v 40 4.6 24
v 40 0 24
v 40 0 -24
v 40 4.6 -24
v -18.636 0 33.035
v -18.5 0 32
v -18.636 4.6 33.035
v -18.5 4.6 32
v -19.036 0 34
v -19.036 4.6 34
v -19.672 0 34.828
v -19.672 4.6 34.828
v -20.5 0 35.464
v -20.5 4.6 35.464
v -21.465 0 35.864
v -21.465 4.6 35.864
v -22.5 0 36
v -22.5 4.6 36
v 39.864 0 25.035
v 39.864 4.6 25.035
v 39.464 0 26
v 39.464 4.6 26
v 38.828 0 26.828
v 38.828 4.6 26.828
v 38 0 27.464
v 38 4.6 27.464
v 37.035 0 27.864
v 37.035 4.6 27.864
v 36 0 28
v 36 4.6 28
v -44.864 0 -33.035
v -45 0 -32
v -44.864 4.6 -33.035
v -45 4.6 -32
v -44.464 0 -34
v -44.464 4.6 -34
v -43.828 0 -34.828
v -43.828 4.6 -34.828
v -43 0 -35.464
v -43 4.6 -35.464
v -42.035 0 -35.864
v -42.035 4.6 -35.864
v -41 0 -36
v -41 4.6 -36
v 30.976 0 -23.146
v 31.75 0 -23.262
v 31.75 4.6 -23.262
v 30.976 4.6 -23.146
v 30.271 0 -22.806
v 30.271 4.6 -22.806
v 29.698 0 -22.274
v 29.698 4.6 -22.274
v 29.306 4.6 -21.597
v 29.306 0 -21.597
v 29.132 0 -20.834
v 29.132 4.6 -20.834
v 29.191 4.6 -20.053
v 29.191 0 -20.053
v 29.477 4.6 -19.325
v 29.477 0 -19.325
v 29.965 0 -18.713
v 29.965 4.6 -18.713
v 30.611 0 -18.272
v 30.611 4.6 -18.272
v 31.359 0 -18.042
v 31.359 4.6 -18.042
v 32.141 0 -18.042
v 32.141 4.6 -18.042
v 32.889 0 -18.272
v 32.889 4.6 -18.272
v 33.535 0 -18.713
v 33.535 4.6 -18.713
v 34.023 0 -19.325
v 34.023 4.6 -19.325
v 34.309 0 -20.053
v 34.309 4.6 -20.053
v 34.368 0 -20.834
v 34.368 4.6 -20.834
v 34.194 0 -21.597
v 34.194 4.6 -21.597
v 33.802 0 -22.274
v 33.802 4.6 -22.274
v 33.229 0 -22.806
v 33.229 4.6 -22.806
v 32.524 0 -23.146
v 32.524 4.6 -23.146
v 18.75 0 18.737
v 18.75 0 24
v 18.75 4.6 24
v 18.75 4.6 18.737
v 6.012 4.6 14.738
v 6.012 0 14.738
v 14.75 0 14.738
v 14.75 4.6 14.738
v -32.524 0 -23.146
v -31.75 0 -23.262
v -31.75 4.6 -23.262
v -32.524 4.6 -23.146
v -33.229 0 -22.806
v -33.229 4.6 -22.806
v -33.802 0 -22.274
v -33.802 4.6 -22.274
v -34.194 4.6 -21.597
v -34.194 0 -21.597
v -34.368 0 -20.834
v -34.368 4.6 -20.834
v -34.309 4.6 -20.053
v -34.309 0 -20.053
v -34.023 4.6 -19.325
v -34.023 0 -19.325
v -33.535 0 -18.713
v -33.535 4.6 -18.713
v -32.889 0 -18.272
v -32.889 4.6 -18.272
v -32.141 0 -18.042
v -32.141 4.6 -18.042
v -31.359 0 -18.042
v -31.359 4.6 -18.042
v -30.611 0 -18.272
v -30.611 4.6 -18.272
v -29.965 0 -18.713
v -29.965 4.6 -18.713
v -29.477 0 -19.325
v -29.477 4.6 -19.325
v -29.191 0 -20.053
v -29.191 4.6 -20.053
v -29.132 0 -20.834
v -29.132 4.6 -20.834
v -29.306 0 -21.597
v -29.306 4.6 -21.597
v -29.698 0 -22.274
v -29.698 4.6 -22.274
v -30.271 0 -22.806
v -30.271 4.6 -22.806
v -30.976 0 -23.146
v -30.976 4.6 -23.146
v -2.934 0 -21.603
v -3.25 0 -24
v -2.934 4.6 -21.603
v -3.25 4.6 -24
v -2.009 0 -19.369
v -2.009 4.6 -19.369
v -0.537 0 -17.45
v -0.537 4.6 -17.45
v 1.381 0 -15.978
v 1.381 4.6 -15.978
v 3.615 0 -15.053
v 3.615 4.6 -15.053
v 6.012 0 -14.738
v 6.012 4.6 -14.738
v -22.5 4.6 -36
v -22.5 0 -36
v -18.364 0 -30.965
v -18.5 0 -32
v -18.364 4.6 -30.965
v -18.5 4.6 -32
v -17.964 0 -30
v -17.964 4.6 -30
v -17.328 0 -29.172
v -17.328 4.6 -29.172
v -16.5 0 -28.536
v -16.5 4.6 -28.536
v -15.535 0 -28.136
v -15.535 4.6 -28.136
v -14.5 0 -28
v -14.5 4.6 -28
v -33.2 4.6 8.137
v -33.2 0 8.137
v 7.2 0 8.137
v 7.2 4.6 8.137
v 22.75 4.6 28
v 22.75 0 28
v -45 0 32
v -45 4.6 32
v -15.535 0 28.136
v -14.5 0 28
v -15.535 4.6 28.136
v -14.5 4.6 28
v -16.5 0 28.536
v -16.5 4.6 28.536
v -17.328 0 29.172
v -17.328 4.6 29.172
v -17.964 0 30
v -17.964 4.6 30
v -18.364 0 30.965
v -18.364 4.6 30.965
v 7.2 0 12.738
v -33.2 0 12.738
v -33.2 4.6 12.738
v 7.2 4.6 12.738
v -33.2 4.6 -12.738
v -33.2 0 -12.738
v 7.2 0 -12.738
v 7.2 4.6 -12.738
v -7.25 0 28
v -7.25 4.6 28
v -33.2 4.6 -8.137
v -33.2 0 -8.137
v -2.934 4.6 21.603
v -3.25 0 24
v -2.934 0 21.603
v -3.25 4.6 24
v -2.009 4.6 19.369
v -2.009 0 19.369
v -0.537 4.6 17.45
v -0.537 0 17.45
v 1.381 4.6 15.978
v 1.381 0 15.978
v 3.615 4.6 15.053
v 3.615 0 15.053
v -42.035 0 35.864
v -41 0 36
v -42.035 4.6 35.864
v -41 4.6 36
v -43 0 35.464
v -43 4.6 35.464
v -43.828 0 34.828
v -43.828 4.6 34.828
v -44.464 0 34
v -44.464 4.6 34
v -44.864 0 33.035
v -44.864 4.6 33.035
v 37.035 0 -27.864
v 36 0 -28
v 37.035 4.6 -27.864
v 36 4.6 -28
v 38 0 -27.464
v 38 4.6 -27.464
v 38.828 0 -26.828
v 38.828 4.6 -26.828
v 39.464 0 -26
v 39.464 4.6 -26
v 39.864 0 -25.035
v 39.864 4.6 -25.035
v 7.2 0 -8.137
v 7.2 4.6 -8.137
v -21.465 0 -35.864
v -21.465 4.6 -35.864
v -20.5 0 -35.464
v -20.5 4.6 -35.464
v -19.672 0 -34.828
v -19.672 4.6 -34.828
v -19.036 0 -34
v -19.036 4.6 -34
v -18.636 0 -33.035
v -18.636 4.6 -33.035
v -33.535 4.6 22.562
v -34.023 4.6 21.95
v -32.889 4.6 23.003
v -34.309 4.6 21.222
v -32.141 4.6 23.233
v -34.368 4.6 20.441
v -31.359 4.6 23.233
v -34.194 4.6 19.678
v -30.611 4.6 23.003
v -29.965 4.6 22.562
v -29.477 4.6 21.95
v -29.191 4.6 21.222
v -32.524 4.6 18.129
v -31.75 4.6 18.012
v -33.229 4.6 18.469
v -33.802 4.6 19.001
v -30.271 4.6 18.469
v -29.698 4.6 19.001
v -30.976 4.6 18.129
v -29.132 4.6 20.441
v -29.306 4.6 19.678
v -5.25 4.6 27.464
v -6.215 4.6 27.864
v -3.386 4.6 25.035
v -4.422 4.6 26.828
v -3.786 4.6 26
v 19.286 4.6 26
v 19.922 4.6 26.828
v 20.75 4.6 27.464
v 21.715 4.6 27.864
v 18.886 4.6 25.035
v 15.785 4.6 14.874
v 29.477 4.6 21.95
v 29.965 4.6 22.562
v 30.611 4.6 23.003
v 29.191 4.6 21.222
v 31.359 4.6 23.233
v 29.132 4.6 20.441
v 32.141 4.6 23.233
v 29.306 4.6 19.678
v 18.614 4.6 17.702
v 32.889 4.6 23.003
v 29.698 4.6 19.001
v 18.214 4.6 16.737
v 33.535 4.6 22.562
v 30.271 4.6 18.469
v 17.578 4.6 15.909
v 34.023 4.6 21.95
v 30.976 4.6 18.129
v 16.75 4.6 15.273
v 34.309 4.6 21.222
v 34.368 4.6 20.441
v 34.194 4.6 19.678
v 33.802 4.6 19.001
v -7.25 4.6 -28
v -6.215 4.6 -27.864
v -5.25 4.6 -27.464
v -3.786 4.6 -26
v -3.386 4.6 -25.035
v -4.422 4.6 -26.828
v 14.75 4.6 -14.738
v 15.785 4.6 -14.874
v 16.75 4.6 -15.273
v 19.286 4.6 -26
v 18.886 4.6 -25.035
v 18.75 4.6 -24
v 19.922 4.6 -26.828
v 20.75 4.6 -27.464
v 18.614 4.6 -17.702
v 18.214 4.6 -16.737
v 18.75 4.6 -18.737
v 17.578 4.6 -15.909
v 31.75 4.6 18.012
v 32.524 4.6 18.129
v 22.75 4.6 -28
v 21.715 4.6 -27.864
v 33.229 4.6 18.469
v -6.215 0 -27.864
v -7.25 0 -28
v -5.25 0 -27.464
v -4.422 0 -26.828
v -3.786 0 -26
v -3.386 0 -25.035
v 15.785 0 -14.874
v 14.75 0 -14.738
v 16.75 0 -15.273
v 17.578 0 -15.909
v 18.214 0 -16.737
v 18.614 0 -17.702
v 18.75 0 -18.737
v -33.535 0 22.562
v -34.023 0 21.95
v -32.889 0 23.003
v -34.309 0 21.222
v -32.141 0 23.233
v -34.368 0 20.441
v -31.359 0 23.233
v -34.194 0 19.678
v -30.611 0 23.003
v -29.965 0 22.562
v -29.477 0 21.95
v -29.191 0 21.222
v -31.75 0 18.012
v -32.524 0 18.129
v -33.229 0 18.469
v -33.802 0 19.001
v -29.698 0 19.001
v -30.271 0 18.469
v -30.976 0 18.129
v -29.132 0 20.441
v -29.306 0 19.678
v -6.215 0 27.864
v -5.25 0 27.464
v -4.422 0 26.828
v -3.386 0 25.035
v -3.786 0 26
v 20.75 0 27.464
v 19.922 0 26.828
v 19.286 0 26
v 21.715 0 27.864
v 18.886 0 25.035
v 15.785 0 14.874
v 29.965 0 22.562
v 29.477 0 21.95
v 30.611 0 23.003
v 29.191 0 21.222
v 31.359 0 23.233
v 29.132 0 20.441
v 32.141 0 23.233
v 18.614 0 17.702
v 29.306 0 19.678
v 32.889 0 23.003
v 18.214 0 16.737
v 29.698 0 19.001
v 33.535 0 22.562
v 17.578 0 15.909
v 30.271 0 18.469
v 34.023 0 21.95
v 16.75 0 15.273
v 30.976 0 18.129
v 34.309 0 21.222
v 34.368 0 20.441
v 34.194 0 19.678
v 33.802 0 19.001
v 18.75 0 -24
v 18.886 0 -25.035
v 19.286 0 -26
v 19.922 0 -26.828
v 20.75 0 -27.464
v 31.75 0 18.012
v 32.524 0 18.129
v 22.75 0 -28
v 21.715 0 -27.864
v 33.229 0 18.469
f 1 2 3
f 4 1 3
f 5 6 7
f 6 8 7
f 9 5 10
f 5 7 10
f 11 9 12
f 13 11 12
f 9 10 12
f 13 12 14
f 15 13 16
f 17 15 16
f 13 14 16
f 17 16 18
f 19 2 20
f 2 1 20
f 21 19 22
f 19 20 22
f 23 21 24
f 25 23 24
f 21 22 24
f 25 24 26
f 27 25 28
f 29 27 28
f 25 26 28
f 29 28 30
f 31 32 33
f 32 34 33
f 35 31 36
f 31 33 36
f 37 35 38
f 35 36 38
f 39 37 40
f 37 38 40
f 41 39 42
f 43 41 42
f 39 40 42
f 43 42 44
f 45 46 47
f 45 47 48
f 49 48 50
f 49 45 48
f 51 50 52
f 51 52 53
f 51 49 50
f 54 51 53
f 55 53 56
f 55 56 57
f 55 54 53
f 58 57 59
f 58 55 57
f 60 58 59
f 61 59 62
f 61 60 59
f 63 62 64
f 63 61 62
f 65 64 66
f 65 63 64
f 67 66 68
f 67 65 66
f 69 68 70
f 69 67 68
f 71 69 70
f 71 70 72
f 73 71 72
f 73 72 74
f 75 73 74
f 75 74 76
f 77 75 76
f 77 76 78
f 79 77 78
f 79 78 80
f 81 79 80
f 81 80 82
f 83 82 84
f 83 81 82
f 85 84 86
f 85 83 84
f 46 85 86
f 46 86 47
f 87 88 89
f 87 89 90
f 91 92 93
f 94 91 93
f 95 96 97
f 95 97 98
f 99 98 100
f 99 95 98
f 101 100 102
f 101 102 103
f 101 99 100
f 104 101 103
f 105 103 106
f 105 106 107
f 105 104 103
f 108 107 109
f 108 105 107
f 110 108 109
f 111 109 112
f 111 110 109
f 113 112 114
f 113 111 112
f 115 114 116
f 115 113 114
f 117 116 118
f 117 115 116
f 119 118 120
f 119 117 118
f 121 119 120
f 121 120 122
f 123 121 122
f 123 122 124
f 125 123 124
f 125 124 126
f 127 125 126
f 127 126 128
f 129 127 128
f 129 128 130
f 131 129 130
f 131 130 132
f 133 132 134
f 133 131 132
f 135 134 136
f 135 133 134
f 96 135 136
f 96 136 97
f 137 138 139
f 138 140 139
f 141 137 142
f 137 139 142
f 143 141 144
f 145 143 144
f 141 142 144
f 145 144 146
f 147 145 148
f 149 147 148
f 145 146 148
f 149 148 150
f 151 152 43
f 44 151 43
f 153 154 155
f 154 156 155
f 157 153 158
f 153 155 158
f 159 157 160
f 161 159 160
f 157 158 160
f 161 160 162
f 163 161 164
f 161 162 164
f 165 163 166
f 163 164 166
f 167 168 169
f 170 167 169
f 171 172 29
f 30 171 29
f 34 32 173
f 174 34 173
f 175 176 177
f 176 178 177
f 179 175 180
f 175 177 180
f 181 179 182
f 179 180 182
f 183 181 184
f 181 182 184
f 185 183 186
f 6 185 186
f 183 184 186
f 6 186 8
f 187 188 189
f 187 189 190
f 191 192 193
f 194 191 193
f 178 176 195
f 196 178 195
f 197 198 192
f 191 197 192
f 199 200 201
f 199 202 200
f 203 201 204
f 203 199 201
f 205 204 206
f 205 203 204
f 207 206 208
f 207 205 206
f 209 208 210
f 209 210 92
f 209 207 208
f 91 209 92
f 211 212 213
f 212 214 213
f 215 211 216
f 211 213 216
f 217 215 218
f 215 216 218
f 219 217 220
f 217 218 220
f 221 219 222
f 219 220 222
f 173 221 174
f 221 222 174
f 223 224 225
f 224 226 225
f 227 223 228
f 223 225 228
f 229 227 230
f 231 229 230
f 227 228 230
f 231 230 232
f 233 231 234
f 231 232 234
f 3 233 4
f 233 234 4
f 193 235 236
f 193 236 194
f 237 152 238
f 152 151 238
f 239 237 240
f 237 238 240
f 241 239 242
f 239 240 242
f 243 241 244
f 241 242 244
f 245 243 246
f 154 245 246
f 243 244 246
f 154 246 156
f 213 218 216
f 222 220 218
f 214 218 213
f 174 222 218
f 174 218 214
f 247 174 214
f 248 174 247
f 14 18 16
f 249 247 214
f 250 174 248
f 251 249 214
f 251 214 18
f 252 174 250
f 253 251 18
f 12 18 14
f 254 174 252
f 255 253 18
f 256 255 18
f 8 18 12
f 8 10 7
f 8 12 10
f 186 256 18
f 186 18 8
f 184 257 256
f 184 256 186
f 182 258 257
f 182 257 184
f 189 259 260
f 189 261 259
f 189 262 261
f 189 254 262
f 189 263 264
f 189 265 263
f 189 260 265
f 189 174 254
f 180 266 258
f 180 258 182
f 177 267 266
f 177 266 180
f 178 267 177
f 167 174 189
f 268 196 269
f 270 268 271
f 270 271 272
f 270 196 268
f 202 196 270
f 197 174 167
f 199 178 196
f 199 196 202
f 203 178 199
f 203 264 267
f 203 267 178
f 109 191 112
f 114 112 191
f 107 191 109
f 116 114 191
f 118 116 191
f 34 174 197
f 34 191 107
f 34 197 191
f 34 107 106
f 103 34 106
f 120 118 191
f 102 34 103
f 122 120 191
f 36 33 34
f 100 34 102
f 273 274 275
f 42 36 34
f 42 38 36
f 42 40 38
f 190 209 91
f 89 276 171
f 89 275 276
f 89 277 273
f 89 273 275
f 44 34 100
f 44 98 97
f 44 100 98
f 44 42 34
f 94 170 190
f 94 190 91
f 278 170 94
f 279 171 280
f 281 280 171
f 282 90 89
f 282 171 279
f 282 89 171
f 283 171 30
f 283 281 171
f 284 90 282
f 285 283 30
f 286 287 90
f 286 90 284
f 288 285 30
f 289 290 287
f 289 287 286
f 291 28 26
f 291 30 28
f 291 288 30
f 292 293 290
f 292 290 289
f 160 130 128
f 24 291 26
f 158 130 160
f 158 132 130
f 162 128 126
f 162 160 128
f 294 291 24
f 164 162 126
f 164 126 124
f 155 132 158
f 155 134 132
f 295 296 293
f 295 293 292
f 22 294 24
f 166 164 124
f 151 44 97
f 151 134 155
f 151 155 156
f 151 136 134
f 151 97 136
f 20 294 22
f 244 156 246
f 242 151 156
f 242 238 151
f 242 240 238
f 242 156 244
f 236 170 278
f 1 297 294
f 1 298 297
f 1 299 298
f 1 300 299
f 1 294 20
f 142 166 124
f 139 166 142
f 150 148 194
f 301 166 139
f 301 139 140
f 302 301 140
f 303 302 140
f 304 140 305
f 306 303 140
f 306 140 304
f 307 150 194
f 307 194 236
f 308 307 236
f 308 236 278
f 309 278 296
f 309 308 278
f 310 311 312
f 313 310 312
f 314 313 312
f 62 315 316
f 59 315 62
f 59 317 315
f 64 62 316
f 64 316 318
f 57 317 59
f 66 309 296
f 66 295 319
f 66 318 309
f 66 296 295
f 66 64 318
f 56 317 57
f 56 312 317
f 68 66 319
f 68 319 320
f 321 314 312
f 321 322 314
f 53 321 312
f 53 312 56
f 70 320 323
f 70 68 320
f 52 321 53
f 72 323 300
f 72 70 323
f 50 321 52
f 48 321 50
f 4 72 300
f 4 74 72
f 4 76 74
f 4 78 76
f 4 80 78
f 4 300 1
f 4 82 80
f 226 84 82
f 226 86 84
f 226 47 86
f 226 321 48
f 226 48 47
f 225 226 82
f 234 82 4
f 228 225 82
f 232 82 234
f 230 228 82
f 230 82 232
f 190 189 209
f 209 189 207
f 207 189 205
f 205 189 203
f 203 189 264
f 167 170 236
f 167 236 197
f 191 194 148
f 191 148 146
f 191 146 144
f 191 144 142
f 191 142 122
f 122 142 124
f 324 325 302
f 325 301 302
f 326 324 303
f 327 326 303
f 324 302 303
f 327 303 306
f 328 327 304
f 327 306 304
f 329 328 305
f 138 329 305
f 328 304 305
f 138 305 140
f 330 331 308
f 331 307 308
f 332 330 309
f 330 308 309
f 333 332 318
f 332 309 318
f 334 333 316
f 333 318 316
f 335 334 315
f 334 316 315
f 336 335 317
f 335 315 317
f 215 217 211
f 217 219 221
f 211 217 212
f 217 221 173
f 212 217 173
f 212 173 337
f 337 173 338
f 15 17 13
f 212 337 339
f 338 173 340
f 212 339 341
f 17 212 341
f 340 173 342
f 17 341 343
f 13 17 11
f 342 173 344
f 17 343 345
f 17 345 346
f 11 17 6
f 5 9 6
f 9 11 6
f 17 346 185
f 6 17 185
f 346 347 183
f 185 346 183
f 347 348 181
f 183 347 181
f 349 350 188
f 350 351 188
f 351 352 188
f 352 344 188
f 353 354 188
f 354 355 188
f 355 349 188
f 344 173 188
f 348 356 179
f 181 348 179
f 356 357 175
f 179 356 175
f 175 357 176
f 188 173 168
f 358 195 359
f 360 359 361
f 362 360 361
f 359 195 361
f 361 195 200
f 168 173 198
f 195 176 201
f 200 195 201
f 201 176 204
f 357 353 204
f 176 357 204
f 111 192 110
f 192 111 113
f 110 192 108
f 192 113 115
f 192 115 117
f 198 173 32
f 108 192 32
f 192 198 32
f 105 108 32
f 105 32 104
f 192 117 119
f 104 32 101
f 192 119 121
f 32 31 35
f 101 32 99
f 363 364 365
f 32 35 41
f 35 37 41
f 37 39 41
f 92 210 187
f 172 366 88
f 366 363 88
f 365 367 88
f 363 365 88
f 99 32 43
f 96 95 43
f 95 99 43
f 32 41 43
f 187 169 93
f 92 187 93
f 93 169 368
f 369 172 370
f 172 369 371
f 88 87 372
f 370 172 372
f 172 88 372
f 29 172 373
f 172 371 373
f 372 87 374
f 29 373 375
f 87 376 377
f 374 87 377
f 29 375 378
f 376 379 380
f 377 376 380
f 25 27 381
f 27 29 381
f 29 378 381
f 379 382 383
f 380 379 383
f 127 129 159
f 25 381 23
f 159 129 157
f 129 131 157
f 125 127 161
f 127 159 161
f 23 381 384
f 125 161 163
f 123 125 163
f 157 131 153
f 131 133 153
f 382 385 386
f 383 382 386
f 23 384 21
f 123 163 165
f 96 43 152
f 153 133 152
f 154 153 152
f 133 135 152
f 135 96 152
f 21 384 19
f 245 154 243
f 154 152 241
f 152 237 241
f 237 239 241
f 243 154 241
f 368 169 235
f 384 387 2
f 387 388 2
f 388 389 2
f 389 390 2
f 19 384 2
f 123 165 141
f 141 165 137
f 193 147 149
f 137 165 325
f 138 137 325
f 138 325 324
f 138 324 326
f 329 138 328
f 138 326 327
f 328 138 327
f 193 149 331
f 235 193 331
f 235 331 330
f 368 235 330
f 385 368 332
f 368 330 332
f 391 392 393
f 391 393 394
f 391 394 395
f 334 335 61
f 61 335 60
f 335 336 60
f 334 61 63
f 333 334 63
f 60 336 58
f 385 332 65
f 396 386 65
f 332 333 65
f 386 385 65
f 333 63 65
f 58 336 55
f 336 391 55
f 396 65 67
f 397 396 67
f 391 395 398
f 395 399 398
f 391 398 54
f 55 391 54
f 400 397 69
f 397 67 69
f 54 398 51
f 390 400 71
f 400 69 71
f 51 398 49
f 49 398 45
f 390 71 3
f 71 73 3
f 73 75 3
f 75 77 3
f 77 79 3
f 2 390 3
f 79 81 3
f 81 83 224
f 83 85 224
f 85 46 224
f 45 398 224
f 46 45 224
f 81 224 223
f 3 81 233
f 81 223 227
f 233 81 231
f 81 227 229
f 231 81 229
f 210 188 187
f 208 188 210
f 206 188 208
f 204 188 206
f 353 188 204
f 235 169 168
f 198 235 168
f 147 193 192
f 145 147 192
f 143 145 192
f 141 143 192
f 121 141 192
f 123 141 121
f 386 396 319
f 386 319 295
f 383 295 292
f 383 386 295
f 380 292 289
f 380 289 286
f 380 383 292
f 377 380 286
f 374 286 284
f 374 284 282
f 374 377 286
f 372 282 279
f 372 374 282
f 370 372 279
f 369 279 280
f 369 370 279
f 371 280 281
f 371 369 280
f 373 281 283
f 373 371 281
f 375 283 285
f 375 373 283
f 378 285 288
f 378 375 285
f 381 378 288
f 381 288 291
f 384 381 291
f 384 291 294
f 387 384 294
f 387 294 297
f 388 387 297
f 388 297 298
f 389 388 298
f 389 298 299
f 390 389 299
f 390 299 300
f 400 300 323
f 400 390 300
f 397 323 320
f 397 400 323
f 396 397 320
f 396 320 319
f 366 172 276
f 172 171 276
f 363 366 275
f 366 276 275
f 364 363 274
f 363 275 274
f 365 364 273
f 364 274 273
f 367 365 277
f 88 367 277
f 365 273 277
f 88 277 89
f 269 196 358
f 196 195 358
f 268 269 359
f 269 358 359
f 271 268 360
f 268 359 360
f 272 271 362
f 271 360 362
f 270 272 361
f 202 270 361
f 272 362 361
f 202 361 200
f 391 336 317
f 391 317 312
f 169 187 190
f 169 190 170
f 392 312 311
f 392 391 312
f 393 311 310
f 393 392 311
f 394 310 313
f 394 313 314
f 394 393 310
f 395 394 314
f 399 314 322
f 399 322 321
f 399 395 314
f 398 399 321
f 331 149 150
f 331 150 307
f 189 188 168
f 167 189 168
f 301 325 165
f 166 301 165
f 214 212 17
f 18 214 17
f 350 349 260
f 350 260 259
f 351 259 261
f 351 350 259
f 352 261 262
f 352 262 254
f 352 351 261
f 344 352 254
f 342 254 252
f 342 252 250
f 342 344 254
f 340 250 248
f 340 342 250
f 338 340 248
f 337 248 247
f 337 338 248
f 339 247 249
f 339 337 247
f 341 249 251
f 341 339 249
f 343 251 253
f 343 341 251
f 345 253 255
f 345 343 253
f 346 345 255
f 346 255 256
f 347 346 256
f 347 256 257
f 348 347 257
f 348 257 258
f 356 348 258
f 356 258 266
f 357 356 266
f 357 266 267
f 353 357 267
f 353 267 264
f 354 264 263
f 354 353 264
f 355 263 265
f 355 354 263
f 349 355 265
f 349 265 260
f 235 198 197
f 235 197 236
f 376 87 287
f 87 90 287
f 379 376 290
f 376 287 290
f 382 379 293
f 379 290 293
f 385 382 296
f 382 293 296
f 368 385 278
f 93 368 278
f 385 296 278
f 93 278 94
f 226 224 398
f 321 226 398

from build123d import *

# Parameters (mm, degrees)
EXTRUDE_1_DEPTH     = 4.6
SKETCH_1_R          = 2.625
SKETCH_1_W          = 40.4
SKETCH_1_H          = 4.6
CUT_EXTRUDE_1_DEPTH = 4.6
FILLET_2_R          = 4
FILLET_3_R          = 9.2625


with BuildPart() as part:
    # 草图3 → 凸台-拉伸1 (new body)
    with BuildSketch(Plane(origin=(0, 0, 0), x_dir=(1, 0, 0), z_dir=(0, 1, 0))):
        Polygon((-18.5, -28), (40, -28), (40, 28), (-18.5, 28), (-18.5, 36), (-45, 36), (-45, 28), (-45, -28), (-45, -36), (-18.5, -36), align=None)
    extrude(amount=EXTRUDE_1_DEPTH)

    # 草图1 → 切除-拉伸1 (cut)
    with BuildSketch(Plane(origin=(0, 0, 0), x_dir=(1, 0, 0), z_dir=(0, 1, 0))):
        with Locations(Location((-31.75, 20.6375, 0), (0, 0, 90))):
            Circle(SKETCH_1_R)
        with Locations(Location((31.75, 20.6375, 0), (0, 0, 90))):
            Circle(SKETCH_1_R)
        with Locations(Location((31.75, -20.6375, 0), (0, 0, 90))):
            Circle(SKETCH_1_R)
        with Locations(Location((-31.75, -20.6375, 0), (0, 0, 90))):
            Circle(SKETCH_1_R)
        with Locations((-13, -10.4375)):
            Rectangle(SKETCH_1_W, SKETCH_1_H)
        with Locations((-13, 10.4375)):
            Rectangle(SKETCH_1_W, SKETCH_1_H)
        Polygon((-3.25, -26.5375), (-3.25, -14.7375), (18.75, -14.7375), (18.75, -26.5375), (18.75, -29.869530405), (-3.25, -29.869530405), align=None)
        Polygon((-3.25, 14.7375), (18.75, 14.7375), (18.75, 26.5375), (18.75, 29.869530405), (-3.25, 29.869530405), (-3.25, 26.5375), align=None)
    extrude(amount=CUT_EXTRUDE_1_DEPTH, mode=Mode.SUBTRACT)

    # 圆角2
    fillet_2_edges = [part.edges().sort_by_distance(p)[0] for p in [
        (-3.25, 2.3, -28),
        (18.75, 2.3, -28),
        (40, 2.3, -28),
        (40, 2.3, 28),
        (18.75, 2.3, 28),
        (-3.25, 2.3, 28),
        (18.75, 2.3, -14.7375),
        (18.75, 2.3, 14.7375),
        (-18.5, 2.3, 28),
        (-18.5, 2.3, 36),
        (-45, 2.3, 36),
        (-45, 2.3, -36),
        (-18.5, 2.3, -36),
        (-18.5, 2.3, -28),
    ]]
    fillet(fillet_2_edges, radius=FILLET_2_R - 0.0001)  # a hair under: the kernel refuses the full size

    # 圆角3
    fillet_3_edges = [part.edges().sort_by_distance(p)[0] for p in [
        (-3.25, 2.3, -14.7375),
        (-3.25, 2.3, 14.7375),
    ]]
    fillet(fillet_3_edges, radius=FILLET_3_R)


solid = part.part
